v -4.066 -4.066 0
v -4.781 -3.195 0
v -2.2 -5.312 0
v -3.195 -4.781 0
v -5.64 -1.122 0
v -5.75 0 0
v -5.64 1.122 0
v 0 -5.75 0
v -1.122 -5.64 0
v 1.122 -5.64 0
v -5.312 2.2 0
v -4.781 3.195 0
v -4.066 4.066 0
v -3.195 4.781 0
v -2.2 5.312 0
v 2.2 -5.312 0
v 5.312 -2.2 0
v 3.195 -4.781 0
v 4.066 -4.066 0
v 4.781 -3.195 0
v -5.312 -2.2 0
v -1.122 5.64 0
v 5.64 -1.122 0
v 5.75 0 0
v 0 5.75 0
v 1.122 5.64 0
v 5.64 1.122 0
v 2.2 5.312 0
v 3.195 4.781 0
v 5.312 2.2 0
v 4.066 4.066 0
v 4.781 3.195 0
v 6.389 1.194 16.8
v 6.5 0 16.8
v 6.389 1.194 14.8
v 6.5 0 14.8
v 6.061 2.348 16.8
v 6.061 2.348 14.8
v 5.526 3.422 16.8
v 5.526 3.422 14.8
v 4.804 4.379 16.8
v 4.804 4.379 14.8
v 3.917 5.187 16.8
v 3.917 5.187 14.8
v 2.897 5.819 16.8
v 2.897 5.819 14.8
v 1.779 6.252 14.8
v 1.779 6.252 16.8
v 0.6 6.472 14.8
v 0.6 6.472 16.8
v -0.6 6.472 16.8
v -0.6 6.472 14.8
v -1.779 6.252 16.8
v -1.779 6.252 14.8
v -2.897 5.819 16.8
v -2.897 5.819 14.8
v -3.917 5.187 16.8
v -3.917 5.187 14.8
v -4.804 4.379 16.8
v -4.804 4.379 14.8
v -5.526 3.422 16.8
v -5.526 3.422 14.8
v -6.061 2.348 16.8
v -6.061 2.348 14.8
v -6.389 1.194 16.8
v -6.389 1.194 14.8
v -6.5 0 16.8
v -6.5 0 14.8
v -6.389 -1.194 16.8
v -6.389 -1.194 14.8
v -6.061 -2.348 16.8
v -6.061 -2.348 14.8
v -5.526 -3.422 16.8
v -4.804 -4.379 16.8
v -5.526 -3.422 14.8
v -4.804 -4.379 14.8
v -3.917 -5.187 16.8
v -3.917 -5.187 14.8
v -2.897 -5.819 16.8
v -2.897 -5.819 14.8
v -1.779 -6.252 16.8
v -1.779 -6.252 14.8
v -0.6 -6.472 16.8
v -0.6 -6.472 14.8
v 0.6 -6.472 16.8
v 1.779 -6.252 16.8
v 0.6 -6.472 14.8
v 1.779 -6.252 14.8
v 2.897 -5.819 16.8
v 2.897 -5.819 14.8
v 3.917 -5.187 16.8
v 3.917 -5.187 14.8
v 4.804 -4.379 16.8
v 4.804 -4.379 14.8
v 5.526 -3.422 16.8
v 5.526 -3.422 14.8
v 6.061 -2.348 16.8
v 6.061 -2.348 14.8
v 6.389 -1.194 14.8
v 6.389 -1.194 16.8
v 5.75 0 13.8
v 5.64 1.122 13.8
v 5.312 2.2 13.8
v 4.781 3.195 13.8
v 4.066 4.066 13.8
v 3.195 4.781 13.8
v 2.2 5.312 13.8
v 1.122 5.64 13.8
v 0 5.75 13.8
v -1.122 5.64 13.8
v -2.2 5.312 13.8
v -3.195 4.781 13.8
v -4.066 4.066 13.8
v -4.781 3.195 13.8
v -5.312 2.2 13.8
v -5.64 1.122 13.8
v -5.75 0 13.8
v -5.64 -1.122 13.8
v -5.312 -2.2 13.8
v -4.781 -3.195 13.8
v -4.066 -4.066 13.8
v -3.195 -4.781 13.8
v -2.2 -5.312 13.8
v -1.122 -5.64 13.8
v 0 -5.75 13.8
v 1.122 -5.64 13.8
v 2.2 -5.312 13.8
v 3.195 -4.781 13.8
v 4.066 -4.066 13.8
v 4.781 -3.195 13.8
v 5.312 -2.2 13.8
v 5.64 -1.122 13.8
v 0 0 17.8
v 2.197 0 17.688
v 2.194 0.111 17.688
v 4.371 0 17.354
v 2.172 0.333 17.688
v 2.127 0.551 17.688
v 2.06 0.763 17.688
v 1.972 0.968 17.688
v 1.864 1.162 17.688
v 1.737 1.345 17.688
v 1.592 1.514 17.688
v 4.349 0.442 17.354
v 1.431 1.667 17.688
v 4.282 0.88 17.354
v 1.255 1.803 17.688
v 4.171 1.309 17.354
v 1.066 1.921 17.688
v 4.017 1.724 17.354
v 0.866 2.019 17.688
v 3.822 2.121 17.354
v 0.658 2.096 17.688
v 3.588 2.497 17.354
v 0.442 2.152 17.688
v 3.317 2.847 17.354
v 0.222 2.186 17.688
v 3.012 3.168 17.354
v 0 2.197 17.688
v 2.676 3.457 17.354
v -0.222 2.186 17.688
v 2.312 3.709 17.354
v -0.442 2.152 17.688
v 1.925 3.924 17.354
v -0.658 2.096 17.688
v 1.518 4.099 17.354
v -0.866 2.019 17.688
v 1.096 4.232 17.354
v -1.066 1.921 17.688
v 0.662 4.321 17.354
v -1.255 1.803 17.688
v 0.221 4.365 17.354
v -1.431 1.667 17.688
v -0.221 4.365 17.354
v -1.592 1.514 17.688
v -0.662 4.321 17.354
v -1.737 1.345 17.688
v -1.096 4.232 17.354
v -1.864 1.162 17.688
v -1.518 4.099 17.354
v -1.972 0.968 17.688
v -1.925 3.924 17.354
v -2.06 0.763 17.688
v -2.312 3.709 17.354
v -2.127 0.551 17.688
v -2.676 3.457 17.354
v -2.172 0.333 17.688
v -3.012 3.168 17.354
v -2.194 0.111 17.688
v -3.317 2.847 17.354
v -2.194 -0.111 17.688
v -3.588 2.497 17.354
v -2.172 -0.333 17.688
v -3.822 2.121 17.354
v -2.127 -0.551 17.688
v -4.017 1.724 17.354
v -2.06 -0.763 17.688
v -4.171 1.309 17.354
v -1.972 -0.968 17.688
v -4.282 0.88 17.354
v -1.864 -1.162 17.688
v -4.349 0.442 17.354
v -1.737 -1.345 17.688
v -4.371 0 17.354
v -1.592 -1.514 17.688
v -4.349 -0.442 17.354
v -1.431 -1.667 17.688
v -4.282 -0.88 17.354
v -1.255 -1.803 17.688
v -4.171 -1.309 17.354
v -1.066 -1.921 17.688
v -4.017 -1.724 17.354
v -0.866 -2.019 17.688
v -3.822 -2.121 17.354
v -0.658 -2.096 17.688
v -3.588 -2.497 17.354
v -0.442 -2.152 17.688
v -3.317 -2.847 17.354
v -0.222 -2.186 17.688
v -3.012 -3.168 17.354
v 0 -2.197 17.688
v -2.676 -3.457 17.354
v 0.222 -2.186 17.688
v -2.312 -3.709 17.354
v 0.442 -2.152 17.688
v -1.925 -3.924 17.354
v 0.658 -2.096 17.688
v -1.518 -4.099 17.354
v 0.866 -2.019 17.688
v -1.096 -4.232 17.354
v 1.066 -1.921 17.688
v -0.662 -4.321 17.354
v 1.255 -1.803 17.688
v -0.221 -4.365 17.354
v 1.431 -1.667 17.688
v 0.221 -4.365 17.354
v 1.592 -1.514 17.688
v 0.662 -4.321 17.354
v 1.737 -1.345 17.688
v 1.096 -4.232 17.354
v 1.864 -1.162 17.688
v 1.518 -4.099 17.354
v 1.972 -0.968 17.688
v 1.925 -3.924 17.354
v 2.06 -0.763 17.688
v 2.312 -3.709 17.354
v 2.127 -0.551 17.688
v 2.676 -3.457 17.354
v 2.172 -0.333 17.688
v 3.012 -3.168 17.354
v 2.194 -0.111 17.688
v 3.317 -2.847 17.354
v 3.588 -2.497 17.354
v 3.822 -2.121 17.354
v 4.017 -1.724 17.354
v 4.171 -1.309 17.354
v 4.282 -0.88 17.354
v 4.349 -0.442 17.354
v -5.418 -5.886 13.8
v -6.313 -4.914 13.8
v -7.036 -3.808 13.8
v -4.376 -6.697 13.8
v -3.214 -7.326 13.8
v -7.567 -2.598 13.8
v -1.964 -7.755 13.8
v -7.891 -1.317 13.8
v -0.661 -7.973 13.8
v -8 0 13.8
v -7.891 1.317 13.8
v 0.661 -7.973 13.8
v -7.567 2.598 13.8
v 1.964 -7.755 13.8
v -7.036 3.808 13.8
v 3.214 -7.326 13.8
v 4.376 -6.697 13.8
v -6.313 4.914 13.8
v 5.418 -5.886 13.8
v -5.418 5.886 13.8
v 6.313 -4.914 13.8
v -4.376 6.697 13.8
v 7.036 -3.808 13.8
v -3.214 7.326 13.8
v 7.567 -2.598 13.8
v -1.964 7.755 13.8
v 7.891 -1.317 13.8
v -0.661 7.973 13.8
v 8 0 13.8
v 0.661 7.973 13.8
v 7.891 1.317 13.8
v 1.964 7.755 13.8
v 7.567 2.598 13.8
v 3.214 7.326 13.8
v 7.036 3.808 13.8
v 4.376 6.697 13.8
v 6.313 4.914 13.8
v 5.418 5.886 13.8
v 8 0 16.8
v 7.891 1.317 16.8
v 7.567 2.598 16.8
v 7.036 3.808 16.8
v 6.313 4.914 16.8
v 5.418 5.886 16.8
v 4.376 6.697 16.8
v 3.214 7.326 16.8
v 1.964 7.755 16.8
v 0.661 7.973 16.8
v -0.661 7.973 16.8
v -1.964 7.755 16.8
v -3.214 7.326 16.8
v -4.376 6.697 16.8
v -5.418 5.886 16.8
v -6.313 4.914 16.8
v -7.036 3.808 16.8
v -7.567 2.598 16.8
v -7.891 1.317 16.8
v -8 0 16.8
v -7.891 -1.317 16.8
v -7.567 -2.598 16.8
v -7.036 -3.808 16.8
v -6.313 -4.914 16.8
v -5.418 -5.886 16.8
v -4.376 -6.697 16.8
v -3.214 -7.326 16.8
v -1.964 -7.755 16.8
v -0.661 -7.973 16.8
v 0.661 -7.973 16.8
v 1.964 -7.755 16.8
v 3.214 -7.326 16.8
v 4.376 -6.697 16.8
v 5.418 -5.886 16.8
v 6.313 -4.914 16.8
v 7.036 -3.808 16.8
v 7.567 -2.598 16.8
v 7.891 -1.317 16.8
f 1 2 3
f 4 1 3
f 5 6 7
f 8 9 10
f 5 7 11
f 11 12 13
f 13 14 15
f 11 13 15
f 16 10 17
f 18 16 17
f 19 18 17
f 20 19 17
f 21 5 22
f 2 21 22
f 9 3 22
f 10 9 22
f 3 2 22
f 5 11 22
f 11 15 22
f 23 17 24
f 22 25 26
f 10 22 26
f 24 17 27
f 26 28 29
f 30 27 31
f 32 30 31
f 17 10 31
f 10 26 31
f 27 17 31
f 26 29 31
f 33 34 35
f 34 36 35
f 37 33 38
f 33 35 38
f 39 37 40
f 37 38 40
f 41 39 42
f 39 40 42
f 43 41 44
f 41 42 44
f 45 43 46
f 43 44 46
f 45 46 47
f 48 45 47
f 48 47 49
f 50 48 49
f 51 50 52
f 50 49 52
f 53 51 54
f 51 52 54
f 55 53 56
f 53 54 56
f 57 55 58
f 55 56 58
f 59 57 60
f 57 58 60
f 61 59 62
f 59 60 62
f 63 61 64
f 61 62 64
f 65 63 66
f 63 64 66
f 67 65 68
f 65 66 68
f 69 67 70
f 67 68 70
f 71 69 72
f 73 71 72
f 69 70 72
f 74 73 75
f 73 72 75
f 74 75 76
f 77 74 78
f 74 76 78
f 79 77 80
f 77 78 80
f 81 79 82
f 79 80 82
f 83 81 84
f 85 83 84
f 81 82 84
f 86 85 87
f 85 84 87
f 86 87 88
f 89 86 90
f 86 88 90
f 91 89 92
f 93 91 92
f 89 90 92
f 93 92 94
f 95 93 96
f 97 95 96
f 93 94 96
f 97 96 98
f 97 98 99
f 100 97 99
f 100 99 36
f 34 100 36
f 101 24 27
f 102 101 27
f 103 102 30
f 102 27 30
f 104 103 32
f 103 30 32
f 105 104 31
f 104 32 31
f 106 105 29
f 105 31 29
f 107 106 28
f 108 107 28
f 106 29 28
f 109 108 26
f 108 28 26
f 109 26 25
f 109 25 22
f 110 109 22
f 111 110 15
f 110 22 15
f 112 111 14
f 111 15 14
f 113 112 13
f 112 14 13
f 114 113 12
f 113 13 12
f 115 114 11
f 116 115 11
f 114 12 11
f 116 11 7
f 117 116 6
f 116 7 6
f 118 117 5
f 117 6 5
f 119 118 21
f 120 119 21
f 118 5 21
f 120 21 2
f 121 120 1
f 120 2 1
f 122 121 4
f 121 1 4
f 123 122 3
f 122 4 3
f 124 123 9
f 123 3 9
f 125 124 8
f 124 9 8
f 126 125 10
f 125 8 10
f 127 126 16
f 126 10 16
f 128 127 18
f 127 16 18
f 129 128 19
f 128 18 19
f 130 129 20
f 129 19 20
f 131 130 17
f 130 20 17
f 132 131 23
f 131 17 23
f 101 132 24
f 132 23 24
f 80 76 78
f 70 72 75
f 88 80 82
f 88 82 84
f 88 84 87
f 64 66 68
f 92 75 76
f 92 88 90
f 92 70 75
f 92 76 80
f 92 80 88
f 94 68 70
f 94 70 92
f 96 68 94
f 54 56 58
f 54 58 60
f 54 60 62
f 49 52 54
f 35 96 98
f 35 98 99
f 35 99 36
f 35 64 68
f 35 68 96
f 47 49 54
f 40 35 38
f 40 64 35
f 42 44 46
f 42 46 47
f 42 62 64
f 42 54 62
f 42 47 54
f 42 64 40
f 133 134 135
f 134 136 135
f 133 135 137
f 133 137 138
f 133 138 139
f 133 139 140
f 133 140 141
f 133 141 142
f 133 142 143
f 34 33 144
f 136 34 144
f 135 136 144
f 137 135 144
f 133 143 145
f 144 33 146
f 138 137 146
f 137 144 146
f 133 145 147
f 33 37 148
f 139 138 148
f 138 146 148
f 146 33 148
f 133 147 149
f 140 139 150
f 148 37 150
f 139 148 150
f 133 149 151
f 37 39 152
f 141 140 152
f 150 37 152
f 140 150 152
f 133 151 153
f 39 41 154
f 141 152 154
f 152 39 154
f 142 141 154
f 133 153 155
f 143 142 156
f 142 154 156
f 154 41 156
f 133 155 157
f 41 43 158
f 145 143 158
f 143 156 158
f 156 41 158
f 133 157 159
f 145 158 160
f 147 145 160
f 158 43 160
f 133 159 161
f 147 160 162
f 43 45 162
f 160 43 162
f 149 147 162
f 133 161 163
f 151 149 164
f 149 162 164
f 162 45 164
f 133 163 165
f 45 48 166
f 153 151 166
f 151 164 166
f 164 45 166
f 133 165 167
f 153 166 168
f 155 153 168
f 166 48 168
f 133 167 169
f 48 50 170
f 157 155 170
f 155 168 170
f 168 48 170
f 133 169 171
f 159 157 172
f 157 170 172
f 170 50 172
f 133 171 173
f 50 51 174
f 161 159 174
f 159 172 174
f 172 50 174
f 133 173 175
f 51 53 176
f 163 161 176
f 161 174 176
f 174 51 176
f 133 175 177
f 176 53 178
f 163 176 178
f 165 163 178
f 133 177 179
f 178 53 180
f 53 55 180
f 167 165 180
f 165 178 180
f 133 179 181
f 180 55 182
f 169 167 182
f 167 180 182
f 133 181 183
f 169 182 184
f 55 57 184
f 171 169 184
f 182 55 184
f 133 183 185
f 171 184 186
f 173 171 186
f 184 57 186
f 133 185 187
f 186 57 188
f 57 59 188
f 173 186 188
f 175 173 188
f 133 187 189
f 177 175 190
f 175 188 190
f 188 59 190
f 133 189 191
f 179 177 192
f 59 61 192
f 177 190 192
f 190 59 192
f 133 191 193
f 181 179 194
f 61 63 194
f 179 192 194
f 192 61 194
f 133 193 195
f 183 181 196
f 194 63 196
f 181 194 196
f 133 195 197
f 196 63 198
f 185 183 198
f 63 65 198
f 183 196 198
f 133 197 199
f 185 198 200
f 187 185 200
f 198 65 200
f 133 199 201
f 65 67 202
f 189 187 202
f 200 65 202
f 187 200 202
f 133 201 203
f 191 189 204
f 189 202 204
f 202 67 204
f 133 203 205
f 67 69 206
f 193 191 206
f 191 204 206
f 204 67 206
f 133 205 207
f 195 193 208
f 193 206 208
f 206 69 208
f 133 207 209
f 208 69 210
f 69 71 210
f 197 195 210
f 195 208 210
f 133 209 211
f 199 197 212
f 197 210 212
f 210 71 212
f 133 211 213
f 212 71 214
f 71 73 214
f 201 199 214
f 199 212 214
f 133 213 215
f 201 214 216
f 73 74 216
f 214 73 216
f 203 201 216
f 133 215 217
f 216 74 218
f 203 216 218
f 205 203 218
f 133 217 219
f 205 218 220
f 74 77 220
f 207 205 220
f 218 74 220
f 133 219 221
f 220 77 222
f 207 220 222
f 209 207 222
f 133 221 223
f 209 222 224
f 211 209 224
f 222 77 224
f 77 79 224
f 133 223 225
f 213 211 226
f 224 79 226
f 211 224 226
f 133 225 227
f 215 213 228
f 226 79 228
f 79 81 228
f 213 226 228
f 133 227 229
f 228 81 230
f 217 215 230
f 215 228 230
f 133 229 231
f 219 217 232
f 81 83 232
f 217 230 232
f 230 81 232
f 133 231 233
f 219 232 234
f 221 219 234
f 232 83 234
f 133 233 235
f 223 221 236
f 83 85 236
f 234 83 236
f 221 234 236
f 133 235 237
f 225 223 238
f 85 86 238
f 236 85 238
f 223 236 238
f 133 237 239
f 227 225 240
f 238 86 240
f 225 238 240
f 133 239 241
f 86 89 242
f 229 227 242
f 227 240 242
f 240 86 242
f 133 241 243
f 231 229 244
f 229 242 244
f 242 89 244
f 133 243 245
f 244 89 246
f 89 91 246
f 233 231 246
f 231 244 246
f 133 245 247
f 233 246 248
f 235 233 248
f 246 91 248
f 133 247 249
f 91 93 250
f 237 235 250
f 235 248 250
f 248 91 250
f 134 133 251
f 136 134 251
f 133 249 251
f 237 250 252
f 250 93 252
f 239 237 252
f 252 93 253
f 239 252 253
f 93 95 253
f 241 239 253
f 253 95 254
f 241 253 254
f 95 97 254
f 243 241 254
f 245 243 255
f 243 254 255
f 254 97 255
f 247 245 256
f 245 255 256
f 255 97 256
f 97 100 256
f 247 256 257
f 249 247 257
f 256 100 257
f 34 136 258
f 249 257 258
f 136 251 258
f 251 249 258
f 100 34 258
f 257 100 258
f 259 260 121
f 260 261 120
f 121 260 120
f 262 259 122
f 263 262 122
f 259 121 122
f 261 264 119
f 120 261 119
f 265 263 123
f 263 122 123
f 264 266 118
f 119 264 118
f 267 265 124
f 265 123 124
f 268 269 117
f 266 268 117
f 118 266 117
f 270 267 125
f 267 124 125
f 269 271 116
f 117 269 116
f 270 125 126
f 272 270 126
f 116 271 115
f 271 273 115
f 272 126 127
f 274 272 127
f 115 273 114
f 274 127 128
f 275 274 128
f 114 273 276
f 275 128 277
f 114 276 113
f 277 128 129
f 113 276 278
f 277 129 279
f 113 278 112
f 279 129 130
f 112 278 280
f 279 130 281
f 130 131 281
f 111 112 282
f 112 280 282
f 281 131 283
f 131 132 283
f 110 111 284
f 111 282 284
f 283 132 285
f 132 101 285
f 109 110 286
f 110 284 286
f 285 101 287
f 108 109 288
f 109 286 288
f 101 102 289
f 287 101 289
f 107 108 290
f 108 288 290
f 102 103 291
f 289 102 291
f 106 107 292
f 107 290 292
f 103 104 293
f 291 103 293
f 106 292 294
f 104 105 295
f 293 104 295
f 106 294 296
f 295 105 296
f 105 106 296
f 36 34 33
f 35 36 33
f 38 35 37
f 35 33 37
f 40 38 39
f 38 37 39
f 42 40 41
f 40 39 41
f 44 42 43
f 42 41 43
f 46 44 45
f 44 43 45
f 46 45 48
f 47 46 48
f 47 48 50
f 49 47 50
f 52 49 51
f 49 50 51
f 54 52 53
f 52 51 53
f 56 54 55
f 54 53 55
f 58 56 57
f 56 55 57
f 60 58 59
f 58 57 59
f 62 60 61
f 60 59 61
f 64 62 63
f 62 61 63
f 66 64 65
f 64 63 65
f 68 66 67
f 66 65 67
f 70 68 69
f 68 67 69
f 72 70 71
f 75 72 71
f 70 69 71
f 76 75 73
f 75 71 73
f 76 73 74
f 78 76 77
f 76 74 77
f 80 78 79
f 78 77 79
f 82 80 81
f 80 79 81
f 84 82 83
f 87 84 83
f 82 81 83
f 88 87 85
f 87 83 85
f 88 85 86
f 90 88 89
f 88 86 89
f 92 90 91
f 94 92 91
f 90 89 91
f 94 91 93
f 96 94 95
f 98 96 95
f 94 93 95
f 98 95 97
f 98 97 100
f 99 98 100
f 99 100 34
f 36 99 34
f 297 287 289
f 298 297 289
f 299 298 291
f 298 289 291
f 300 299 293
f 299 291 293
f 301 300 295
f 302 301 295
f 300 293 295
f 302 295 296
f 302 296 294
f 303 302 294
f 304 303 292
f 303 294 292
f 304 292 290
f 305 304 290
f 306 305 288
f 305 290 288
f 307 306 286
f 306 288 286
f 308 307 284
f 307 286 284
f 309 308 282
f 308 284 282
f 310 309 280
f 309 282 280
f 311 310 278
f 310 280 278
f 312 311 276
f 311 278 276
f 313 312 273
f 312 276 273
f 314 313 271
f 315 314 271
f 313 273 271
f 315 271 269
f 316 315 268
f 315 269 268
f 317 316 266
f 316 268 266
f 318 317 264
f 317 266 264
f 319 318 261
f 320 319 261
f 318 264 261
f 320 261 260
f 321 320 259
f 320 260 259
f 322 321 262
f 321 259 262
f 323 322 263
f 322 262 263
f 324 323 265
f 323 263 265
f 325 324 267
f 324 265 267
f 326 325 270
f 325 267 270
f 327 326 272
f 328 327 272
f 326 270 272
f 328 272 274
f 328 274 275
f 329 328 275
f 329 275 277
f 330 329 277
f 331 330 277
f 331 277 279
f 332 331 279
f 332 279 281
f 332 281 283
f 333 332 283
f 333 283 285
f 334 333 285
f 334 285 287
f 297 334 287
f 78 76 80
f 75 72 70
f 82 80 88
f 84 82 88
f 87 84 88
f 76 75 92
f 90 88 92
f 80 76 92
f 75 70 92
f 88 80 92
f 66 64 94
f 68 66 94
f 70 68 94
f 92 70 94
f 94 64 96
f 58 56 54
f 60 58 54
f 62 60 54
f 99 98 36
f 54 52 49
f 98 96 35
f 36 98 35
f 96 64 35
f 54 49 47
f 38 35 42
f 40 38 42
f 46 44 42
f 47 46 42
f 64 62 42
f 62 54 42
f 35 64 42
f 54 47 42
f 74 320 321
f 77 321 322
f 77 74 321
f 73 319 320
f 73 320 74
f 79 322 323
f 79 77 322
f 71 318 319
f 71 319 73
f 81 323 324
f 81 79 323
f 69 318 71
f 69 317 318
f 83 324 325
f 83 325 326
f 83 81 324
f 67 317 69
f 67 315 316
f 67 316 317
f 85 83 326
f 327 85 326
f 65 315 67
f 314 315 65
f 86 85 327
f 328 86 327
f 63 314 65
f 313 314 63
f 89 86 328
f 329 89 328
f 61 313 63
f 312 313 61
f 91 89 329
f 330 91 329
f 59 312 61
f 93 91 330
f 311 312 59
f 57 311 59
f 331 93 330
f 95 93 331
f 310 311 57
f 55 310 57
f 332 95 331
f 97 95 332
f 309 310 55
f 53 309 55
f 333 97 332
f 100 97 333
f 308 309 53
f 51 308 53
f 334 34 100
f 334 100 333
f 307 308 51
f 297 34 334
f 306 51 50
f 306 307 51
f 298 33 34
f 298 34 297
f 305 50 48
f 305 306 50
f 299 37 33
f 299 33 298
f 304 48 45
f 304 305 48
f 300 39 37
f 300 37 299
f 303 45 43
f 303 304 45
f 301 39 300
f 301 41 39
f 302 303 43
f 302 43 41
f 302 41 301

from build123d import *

# Parameters (mm, degrees)
SKETCH1_R           = 5.75
BOSS_EXTRUDE1_DEPTH = 13.8
SKETCH2_R           = 8
BOSS_EXTRUDE2_DEPTH = 3
SKETCH3_R           = 6.5
CUT_EXTRUDE1_DEPTH  = 2


with BuildPart() as part:
    # Sketch1 → Boss-Extrude1 (new body)
    with BuildSketch(Plane.XY):
        Circle(SKETCH1_R)
    extrude(amount=BOSS_EXTRUDE1_DEPTH)

    # Sketch2 → Boss-Extrude2 (add)
    with BuildSketch(Plane.XY.offset(13.8)):
        Circle(SKETCH2_R)
    extrude(amount=BOSS_EXTRUDE2_DEPTH)

    # Sketch3 → Cut-Extrude1 (cut)
    with BuildSketch(Plane.XY.offset(16.8)):
        Circle(SKETCH3_R)
    extrude(amount=-CUT_EXTRUDE1_DEPTH, mode=Mode.SUBTRACT)


with BuildPart() as body_2:
    # Sketch4 → Revolve1 (revolve)
    with BuildSketch(Plane(origin=(0, 0, 0), x_dir=(1, 0, 0), z_dir=(0, 1, 0))):
        with BuildLine():
            Line((0, -14.8), (0, -17.8))
            ThreePointArc((0, -17.8), (3.288236609, -17.548537962), (6.5, -16.8))
            Line((6.5, -16.8), (6.5, -14.8))
            Line((6.5, -14.8), (0, -14.8))
        make_face()
    revolve(axis=Axis((0, 0, 14.8), (0, 0, 1)))


solid = Compound([part.part, body_2.part])
